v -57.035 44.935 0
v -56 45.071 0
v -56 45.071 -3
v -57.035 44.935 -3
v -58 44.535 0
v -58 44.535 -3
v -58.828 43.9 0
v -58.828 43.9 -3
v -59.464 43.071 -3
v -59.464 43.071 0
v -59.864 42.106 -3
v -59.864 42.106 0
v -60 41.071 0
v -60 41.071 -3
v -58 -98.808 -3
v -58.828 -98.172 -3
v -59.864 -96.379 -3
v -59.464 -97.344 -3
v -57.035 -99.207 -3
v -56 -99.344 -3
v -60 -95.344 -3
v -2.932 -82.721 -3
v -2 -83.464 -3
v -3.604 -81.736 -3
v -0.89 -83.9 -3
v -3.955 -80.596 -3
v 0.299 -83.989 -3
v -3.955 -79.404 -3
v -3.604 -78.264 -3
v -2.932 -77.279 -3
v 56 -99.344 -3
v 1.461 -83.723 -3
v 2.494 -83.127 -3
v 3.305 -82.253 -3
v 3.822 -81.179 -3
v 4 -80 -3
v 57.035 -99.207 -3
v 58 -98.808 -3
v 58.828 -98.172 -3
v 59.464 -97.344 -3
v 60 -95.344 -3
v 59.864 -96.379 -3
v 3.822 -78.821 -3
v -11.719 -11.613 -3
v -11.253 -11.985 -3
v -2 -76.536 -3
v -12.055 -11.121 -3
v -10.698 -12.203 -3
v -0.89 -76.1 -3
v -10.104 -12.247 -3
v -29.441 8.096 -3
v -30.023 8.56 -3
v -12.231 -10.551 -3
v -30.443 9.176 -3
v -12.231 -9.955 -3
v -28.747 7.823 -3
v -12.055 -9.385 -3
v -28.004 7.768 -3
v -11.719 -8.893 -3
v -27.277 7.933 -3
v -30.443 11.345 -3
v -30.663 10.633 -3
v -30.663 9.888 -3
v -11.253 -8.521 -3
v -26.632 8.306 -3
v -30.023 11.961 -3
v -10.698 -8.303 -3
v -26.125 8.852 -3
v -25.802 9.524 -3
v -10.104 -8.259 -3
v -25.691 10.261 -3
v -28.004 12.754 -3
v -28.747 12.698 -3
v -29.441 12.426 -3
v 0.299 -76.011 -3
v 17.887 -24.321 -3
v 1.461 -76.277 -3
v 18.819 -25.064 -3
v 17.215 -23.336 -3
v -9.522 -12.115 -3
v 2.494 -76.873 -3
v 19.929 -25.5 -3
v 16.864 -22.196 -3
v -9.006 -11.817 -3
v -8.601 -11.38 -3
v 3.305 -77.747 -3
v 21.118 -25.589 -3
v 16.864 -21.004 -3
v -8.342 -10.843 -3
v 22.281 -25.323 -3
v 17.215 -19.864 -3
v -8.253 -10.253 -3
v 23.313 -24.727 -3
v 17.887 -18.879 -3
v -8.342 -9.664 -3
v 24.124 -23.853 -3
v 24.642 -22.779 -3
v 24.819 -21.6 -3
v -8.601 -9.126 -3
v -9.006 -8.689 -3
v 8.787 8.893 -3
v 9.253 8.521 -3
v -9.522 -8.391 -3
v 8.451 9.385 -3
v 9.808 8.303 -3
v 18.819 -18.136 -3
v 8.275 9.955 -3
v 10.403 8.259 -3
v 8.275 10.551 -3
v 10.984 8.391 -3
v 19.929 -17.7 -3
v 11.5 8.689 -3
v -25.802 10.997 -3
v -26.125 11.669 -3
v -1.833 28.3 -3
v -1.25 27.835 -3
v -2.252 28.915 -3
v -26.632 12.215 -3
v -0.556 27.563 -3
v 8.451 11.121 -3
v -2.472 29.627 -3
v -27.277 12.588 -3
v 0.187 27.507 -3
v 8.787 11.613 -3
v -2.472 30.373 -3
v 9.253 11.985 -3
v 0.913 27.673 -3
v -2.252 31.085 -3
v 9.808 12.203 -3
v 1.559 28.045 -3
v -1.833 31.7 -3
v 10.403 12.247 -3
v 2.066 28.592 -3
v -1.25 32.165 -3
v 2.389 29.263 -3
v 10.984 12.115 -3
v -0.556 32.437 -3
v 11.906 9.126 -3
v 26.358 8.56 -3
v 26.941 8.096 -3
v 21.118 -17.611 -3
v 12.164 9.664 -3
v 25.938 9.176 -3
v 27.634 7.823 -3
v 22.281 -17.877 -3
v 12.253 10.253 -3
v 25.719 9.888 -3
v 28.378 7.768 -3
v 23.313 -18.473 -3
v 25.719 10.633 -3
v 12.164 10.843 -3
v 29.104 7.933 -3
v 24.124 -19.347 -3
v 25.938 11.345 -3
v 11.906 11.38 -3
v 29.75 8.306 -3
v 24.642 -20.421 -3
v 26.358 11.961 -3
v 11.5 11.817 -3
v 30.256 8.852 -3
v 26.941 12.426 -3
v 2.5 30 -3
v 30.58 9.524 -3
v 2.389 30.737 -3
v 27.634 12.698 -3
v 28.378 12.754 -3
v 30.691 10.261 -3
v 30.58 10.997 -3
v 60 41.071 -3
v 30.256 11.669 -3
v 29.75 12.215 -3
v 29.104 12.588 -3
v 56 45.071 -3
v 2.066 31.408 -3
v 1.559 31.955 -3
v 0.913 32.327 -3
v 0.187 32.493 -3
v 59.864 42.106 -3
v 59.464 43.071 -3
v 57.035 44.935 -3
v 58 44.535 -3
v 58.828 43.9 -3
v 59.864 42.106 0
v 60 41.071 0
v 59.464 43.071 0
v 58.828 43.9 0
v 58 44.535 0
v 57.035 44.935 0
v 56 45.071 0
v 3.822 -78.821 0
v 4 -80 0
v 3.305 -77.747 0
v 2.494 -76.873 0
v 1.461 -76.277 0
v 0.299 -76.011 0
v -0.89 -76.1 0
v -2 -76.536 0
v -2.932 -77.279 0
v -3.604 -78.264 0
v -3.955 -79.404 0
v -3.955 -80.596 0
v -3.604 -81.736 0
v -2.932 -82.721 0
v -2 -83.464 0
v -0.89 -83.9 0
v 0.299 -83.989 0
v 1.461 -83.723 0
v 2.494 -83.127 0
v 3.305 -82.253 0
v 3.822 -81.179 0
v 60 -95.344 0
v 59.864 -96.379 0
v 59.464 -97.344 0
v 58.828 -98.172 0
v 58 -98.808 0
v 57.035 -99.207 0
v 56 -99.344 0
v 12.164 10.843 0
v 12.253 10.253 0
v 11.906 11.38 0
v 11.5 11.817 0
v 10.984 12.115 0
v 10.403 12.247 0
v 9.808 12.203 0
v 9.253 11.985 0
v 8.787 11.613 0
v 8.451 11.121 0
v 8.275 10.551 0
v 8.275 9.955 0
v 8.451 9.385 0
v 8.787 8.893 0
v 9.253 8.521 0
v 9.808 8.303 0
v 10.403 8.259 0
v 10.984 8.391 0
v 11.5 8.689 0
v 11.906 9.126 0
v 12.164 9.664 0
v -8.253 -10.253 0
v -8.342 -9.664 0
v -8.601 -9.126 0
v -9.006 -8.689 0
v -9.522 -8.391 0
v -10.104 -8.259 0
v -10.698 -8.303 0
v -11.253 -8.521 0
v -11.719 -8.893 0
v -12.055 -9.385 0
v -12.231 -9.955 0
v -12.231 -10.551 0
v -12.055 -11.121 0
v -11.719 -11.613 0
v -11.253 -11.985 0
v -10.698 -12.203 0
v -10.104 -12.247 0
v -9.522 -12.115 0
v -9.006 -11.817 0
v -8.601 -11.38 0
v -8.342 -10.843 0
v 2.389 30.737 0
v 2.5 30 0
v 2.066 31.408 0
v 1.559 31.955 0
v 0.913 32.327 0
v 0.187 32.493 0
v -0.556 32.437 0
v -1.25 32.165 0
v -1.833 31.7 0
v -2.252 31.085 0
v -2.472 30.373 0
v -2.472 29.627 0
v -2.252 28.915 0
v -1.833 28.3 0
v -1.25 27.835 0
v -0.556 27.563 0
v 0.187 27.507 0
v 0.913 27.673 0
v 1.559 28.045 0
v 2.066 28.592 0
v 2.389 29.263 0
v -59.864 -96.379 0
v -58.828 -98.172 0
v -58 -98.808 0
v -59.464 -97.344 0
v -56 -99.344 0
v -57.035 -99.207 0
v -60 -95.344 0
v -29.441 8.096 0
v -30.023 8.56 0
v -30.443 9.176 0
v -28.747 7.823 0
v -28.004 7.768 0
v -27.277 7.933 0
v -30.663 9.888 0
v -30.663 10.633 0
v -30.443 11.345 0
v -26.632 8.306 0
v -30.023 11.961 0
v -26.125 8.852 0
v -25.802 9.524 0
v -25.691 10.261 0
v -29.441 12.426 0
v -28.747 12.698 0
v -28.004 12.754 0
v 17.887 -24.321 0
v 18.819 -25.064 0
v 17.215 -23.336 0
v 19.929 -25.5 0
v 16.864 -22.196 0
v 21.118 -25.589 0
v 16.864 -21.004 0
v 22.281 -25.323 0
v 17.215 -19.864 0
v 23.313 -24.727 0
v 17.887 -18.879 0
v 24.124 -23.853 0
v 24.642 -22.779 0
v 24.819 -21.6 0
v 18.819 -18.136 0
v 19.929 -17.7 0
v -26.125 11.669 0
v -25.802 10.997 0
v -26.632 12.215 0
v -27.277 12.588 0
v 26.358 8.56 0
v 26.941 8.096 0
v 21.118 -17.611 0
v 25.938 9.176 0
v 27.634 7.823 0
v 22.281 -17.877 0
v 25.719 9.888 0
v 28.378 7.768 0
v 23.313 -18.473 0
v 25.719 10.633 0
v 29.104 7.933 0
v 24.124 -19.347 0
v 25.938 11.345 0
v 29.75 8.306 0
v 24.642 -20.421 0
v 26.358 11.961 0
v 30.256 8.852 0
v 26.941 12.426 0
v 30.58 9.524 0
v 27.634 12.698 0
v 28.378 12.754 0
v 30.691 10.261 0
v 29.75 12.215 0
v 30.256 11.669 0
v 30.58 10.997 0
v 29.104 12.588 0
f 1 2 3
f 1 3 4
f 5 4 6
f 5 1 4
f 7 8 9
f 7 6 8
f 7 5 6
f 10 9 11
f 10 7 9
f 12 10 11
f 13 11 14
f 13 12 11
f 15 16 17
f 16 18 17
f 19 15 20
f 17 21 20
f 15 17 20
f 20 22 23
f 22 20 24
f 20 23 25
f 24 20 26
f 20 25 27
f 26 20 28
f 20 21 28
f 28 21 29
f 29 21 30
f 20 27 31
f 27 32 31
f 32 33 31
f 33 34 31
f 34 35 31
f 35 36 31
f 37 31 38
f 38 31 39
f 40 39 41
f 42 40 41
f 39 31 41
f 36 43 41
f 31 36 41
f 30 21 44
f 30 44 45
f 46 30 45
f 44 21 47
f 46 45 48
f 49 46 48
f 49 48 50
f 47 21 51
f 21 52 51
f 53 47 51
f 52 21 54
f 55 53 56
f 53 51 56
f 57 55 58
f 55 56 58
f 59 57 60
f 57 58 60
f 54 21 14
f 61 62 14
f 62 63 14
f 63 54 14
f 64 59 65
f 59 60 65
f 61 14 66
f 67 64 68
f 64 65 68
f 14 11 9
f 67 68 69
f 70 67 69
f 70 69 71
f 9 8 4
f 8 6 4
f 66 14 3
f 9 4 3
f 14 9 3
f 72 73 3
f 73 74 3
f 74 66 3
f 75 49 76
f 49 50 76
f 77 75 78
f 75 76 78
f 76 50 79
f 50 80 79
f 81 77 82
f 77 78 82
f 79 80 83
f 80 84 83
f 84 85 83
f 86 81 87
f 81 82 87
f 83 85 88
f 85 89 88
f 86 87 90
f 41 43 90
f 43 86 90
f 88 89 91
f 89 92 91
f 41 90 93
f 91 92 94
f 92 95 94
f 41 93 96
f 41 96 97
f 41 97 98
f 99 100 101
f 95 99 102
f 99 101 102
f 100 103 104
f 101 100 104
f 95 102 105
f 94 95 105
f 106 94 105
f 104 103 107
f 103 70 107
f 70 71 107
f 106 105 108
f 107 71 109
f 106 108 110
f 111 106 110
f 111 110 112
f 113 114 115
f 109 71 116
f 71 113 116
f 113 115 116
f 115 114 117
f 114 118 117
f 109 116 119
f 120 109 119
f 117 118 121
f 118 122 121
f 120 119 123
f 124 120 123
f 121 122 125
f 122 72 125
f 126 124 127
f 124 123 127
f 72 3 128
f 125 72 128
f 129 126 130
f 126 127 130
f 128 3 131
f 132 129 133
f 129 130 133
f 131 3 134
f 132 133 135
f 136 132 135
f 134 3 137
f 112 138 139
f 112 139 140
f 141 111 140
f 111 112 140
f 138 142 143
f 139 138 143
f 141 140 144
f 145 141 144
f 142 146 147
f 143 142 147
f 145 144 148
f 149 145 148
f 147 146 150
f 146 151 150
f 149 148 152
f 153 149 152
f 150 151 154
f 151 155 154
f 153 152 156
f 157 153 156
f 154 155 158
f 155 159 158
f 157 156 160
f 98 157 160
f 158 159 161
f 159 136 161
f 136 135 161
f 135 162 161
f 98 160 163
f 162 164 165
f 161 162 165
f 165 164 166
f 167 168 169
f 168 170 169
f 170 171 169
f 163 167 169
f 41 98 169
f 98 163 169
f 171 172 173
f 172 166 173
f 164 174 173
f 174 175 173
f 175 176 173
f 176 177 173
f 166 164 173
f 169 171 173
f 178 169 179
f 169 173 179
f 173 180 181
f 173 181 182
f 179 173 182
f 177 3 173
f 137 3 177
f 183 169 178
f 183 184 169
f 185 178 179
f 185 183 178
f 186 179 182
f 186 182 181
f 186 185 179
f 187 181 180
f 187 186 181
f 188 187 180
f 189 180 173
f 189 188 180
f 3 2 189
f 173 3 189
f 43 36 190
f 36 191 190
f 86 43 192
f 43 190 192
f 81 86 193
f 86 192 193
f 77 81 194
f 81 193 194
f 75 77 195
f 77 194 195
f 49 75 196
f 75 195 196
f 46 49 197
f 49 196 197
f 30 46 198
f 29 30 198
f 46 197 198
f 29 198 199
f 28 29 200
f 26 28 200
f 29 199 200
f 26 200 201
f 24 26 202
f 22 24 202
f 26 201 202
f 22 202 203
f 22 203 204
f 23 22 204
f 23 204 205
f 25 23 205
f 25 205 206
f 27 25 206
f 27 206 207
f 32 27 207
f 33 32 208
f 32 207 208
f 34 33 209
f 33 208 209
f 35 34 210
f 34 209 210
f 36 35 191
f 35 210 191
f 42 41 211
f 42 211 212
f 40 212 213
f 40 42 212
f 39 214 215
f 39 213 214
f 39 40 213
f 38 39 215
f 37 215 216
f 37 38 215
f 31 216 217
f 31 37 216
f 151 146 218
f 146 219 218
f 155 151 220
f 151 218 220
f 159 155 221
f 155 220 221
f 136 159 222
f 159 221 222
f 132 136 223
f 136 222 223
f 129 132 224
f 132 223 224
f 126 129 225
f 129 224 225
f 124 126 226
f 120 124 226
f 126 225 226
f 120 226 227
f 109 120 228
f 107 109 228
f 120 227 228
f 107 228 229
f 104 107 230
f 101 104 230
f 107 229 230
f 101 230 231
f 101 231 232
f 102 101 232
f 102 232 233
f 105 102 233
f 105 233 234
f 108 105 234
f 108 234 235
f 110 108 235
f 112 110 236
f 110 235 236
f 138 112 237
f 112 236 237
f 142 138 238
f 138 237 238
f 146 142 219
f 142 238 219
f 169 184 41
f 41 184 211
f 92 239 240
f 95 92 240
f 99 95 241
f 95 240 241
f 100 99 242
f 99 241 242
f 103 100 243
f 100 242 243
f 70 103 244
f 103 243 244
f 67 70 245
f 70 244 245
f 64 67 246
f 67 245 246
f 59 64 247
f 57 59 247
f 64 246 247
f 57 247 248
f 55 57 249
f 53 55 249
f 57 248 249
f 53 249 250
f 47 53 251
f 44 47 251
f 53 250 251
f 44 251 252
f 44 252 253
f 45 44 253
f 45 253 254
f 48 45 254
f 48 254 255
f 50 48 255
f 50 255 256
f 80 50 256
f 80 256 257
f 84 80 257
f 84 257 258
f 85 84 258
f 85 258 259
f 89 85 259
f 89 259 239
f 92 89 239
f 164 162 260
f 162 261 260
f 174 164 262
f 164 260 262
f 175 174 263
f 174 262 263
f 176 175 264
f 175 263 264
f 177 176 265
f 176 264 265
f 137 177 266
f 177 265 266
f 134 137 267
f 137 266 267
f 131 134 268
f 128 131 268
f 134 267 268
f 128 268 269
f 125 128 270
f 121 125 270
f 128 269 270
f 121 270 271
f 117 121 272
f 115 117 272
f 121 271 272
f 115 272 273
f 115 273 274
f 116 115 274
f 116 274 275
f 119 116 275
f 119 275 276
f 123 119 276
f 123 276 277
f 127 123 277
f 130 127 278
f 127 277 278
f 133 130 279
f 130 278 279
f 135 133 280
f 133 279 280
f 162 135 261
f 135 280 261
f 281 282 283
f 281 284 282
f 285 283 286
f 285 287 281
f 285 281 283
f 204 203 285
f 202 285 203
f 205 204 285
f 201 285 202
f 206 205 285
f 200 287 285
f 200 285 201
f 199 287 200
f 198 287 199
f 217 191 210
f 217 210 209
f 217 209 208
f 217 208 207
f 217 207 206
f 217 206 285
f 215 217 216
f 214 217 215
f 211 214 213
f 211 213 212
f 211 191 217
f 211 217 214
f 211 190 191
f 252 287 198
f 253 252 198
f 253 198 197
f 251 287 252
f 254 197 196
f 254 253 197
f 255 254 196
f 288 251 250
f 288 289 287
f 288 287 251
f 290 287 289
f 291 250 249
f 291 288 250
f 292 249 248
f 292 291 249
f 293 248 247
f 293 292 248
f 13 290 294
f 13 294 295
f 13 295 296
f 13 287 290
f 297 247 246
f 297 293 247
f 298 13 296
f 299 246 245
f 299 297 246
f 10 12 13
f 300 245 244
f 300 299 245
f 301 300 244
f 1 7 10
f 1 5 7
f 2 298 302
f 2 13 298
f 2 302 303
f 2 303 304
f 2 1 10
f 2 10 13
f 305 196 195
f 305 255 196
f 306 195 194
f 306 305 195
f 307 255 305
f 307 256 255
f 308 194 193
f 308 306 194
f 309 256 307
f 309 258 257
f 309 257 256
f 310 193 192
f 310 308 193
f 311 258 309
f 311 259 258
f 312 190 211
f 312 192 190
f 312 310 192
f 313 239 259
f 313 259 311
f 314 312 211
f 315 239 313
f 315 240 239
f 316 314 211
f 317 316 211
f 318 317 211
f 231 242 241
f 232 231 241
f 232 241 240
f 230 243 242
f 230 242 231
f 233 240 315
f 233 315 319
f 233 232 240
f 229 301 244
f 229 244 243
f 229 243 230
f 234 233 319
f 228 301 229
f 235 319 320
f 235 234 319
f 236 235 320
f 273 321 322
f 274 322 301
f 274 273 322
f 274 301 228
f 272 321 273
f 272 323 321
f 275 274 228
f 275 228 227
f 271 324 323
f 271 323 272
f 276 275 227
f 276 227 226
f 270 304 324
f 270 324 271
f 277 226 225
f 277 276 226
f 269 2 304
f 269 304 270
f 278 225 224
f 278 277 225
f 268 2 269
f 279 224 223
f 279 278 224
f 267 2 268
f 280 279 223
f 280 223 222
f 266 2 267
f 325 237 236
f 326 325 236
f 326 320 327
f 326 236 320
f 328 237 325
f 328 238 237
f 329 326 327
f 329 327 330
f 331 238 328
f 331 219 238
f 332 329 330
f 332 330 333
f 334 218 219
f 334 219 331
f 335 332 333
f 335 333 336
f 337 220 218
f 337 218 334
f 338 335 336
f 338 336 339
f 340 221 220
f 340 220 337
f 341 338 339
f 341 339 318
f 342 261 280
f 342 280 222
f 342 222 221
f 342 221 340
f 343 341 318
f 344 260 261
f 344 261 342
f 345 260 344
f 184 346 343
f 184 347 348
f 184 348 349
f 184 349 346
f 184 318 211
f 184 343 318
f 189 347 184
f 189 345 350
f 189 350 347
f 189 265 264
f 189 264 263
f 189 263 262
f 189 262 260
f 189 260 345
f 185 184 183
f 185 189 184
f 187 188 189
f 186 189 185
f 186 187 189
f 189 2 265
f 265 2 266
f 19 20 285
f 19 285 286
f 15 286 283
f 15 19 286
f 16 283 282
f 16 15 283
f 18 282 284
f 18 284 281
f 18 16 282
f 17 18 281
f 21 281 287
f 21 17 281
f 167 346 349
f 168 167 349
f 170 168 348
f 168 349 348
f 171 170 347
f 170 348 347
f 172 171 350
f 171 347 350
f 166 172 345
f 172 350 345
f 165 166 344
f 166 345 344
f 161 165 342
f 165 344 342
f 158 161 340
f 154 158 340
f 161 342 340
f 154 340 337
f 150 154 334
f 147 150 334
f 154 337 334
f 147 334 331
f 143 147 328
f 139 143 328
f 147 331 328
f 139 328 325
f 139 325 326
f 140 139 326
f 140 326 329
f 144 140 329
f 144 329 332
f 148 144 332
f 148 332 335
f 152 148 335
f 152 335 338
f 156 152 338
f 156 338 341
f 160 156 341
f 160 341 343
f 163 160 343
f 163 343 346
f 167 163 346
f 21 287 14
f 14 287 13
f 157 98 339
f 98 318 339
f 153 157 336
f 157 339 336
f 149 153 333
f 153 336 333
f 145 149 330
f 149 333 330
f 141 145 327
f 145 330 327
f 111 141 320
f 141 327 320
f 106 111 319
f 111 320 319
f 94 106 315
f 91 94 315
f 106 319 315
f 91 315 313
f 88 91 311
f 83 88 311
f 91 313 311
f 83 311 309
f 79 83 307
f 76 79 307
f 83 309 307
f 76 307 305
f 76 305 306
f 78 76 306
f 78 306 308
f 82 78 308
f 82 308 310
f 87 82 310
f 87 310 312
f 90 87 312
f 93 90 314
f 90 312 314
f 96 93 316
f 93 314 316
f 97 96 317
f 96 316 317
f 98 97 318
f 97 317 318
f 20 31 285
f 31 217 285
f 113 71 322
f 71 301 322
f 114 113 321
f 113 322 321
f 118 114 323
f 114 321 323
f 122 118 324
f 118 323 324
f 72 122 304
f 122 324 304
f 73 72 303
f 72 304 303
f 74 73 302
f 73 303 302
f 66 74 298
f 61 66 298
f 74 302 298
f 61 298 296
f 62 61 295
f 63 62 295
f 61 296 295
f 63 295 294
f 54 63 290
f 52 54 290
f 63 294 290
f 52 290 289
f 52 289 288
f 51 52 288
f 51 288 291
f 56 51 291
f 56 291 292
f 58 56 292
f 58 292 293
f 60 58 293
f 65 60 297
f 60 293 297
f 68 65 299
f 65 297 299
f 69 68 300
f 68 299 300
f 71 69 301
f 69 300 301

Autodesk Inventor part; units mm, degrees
ref_plane "YZ Plane" through (0, 0, 0) normal (1, 0, 0) x (0, 1, 0)
ref_plane "XZ Plane" through (0, 0, 0) normal (0, 1, 0) x (-1, 0, 0)
ref_plane "XY Plane" through (0, 0, 0) normal (0, 0, 1) x (1, 0, 0)
sketch "スケッチ1" plane through (0, 0, 0) normal (0, 0, 1) x (1, 0, 0)
  circle A0 centre (0, 0) radius 21.2
  circle A1 centre (0, 0) radius 7.5
  circle A2 centre (0, 0) radius 30
  circle A3 centre (20.819222, -21.6) radius 22.5
  circle A4 centre (20.819222, -21.6) radius 14
  circle A5 centre (20.819222, -21.6) radius 62
  circle A6 centre (0, -80) radius 48
  circle A7 centre (0, -80) radius 50
  circle A8 centre (20.819222, -21.6) radius 4
  circle A9 centre (0, -80) radius 4
  dimension "d2" = 60
  dimension "d4" = 124
  dimension "d0" = 42.4
  dimension "d1" = 15
  dimension "d3" = 28
  dimension "d5" = 100
  dimension "d23" = 8
  dimension "d41" = 8
sketch "スケッチ2" plane through (0, 0, 0) normal (0, 0, 1) x (1, 0, 0)
  line L0 (0, 0) -> (24.501973, 0) construction
  line L1 (0, 0) -> (12.5, 0) construction
  line L2 (0, 0) -> (10.253048, 10.253048)
  line L3 (0, 0) -> (14.5, 0) construction
  line L4 (10.253048, 10.253048) -> (-10.253048, -10.253048)
  circle A0 centre (10.253048, 10.253048) radius 2
  circle A1 centre (-10.253048, -10.253048) radius 2
  circle A2 centre (0, 0) radius 7.5
  line L5 (0, 0) -> (28.190779, 10.260604)
  line L6 (0, 0) -> (30, 0) construction
  line L7 (0, 0) -> (-28.190779, 10.260604)
  line L8 (0, 0) -> (30, 0) construction
  circle A3 centre (-28.190779, 10.260604) radius 2.5
  line L9 (0, 0) -> (0, 30)
  circle A4 centre (0, 30) radius 2.5
  circle A5 centre (28.190779, 10.260604) radius 2.5
  dimension "d9" = 14.5
  dimension "d10" = 45
  dimension "d11" = 29
  dimension "d12" = 4
  dimension "d13" = 4
  dimension "d14" = 15
  dimension "d15" = 30
  dimension "d16" = 20
  dimension "d17" = 30
  dimension "d18" = 160
  dimension "d19" = 5
  dimension "d20" = 30
  dimension "d21" = 5
  dimension "d22" = 5
sketch "スケッチ3" plane through (0, 0, 0) normal (0, 0, 1) x (1, 0, 0)
  line L0 (60, -99.343647) -> (-60, -99.343647)
  line L1 (-60, -99.343647) -> (-60, 99.343647)
  line L2 (-60, 99.343647) -> (60, 99.343647)
  line L3 (60, 99.343647) -> (60, -99.343647)
  line L4 (60, -99.343647) -> (-60, 99.343647) construction
  line L5 (-60, -99.343647) -> (60, 99.343647) construction
  point P0 (0, 0)
  dimension "d25" = 120
extrude "押し出し1" add sketch "スケッチ3" against normal blind 3
sketch "スケッチ4" plane through (0, 0, 0) normal (0, 0, 1) x (1, 0, 0)
  line L0 (0, 45.071117) -> (68.359536, 45.071117)
  line L1 (68.359536, 45.071117) -> (-74.382402, 45.071117)
  line L2 (-74.382402, 45.071117) -> (108.165644, 45.071117)
  line L3 (108.165644, 45.071117) -> (108.165644, 129.415375)
  line L4 (108.165644, 129.415375) -> (-74.382402, 129.415375)
  line L5 (-74.382402, 129.415375) -> (-74.382402, 45.071117)
  point P0 (0, 0)
extrude "押し出し4" cut sketch "スケッチ4" against normal blind 10
fillet "フィレット1" radius 4 4 edges at (-60, 45.0711, -1.5) (60, 45.0711, -1.5) (-60, -99.3436, -1.5) (60, -99.3436, -1.5)
extrude "押し出し7" cut sketch "スケッチ1" against normal blind 10 contours A8 A2 | A2 A8 | A9 A5 | A5 A9
extrude "押し出し8" cut sketch "スケッチ2" against normal blind 10 contours A0 | A1 | A3 | A4 | A5
properties part number "板"
